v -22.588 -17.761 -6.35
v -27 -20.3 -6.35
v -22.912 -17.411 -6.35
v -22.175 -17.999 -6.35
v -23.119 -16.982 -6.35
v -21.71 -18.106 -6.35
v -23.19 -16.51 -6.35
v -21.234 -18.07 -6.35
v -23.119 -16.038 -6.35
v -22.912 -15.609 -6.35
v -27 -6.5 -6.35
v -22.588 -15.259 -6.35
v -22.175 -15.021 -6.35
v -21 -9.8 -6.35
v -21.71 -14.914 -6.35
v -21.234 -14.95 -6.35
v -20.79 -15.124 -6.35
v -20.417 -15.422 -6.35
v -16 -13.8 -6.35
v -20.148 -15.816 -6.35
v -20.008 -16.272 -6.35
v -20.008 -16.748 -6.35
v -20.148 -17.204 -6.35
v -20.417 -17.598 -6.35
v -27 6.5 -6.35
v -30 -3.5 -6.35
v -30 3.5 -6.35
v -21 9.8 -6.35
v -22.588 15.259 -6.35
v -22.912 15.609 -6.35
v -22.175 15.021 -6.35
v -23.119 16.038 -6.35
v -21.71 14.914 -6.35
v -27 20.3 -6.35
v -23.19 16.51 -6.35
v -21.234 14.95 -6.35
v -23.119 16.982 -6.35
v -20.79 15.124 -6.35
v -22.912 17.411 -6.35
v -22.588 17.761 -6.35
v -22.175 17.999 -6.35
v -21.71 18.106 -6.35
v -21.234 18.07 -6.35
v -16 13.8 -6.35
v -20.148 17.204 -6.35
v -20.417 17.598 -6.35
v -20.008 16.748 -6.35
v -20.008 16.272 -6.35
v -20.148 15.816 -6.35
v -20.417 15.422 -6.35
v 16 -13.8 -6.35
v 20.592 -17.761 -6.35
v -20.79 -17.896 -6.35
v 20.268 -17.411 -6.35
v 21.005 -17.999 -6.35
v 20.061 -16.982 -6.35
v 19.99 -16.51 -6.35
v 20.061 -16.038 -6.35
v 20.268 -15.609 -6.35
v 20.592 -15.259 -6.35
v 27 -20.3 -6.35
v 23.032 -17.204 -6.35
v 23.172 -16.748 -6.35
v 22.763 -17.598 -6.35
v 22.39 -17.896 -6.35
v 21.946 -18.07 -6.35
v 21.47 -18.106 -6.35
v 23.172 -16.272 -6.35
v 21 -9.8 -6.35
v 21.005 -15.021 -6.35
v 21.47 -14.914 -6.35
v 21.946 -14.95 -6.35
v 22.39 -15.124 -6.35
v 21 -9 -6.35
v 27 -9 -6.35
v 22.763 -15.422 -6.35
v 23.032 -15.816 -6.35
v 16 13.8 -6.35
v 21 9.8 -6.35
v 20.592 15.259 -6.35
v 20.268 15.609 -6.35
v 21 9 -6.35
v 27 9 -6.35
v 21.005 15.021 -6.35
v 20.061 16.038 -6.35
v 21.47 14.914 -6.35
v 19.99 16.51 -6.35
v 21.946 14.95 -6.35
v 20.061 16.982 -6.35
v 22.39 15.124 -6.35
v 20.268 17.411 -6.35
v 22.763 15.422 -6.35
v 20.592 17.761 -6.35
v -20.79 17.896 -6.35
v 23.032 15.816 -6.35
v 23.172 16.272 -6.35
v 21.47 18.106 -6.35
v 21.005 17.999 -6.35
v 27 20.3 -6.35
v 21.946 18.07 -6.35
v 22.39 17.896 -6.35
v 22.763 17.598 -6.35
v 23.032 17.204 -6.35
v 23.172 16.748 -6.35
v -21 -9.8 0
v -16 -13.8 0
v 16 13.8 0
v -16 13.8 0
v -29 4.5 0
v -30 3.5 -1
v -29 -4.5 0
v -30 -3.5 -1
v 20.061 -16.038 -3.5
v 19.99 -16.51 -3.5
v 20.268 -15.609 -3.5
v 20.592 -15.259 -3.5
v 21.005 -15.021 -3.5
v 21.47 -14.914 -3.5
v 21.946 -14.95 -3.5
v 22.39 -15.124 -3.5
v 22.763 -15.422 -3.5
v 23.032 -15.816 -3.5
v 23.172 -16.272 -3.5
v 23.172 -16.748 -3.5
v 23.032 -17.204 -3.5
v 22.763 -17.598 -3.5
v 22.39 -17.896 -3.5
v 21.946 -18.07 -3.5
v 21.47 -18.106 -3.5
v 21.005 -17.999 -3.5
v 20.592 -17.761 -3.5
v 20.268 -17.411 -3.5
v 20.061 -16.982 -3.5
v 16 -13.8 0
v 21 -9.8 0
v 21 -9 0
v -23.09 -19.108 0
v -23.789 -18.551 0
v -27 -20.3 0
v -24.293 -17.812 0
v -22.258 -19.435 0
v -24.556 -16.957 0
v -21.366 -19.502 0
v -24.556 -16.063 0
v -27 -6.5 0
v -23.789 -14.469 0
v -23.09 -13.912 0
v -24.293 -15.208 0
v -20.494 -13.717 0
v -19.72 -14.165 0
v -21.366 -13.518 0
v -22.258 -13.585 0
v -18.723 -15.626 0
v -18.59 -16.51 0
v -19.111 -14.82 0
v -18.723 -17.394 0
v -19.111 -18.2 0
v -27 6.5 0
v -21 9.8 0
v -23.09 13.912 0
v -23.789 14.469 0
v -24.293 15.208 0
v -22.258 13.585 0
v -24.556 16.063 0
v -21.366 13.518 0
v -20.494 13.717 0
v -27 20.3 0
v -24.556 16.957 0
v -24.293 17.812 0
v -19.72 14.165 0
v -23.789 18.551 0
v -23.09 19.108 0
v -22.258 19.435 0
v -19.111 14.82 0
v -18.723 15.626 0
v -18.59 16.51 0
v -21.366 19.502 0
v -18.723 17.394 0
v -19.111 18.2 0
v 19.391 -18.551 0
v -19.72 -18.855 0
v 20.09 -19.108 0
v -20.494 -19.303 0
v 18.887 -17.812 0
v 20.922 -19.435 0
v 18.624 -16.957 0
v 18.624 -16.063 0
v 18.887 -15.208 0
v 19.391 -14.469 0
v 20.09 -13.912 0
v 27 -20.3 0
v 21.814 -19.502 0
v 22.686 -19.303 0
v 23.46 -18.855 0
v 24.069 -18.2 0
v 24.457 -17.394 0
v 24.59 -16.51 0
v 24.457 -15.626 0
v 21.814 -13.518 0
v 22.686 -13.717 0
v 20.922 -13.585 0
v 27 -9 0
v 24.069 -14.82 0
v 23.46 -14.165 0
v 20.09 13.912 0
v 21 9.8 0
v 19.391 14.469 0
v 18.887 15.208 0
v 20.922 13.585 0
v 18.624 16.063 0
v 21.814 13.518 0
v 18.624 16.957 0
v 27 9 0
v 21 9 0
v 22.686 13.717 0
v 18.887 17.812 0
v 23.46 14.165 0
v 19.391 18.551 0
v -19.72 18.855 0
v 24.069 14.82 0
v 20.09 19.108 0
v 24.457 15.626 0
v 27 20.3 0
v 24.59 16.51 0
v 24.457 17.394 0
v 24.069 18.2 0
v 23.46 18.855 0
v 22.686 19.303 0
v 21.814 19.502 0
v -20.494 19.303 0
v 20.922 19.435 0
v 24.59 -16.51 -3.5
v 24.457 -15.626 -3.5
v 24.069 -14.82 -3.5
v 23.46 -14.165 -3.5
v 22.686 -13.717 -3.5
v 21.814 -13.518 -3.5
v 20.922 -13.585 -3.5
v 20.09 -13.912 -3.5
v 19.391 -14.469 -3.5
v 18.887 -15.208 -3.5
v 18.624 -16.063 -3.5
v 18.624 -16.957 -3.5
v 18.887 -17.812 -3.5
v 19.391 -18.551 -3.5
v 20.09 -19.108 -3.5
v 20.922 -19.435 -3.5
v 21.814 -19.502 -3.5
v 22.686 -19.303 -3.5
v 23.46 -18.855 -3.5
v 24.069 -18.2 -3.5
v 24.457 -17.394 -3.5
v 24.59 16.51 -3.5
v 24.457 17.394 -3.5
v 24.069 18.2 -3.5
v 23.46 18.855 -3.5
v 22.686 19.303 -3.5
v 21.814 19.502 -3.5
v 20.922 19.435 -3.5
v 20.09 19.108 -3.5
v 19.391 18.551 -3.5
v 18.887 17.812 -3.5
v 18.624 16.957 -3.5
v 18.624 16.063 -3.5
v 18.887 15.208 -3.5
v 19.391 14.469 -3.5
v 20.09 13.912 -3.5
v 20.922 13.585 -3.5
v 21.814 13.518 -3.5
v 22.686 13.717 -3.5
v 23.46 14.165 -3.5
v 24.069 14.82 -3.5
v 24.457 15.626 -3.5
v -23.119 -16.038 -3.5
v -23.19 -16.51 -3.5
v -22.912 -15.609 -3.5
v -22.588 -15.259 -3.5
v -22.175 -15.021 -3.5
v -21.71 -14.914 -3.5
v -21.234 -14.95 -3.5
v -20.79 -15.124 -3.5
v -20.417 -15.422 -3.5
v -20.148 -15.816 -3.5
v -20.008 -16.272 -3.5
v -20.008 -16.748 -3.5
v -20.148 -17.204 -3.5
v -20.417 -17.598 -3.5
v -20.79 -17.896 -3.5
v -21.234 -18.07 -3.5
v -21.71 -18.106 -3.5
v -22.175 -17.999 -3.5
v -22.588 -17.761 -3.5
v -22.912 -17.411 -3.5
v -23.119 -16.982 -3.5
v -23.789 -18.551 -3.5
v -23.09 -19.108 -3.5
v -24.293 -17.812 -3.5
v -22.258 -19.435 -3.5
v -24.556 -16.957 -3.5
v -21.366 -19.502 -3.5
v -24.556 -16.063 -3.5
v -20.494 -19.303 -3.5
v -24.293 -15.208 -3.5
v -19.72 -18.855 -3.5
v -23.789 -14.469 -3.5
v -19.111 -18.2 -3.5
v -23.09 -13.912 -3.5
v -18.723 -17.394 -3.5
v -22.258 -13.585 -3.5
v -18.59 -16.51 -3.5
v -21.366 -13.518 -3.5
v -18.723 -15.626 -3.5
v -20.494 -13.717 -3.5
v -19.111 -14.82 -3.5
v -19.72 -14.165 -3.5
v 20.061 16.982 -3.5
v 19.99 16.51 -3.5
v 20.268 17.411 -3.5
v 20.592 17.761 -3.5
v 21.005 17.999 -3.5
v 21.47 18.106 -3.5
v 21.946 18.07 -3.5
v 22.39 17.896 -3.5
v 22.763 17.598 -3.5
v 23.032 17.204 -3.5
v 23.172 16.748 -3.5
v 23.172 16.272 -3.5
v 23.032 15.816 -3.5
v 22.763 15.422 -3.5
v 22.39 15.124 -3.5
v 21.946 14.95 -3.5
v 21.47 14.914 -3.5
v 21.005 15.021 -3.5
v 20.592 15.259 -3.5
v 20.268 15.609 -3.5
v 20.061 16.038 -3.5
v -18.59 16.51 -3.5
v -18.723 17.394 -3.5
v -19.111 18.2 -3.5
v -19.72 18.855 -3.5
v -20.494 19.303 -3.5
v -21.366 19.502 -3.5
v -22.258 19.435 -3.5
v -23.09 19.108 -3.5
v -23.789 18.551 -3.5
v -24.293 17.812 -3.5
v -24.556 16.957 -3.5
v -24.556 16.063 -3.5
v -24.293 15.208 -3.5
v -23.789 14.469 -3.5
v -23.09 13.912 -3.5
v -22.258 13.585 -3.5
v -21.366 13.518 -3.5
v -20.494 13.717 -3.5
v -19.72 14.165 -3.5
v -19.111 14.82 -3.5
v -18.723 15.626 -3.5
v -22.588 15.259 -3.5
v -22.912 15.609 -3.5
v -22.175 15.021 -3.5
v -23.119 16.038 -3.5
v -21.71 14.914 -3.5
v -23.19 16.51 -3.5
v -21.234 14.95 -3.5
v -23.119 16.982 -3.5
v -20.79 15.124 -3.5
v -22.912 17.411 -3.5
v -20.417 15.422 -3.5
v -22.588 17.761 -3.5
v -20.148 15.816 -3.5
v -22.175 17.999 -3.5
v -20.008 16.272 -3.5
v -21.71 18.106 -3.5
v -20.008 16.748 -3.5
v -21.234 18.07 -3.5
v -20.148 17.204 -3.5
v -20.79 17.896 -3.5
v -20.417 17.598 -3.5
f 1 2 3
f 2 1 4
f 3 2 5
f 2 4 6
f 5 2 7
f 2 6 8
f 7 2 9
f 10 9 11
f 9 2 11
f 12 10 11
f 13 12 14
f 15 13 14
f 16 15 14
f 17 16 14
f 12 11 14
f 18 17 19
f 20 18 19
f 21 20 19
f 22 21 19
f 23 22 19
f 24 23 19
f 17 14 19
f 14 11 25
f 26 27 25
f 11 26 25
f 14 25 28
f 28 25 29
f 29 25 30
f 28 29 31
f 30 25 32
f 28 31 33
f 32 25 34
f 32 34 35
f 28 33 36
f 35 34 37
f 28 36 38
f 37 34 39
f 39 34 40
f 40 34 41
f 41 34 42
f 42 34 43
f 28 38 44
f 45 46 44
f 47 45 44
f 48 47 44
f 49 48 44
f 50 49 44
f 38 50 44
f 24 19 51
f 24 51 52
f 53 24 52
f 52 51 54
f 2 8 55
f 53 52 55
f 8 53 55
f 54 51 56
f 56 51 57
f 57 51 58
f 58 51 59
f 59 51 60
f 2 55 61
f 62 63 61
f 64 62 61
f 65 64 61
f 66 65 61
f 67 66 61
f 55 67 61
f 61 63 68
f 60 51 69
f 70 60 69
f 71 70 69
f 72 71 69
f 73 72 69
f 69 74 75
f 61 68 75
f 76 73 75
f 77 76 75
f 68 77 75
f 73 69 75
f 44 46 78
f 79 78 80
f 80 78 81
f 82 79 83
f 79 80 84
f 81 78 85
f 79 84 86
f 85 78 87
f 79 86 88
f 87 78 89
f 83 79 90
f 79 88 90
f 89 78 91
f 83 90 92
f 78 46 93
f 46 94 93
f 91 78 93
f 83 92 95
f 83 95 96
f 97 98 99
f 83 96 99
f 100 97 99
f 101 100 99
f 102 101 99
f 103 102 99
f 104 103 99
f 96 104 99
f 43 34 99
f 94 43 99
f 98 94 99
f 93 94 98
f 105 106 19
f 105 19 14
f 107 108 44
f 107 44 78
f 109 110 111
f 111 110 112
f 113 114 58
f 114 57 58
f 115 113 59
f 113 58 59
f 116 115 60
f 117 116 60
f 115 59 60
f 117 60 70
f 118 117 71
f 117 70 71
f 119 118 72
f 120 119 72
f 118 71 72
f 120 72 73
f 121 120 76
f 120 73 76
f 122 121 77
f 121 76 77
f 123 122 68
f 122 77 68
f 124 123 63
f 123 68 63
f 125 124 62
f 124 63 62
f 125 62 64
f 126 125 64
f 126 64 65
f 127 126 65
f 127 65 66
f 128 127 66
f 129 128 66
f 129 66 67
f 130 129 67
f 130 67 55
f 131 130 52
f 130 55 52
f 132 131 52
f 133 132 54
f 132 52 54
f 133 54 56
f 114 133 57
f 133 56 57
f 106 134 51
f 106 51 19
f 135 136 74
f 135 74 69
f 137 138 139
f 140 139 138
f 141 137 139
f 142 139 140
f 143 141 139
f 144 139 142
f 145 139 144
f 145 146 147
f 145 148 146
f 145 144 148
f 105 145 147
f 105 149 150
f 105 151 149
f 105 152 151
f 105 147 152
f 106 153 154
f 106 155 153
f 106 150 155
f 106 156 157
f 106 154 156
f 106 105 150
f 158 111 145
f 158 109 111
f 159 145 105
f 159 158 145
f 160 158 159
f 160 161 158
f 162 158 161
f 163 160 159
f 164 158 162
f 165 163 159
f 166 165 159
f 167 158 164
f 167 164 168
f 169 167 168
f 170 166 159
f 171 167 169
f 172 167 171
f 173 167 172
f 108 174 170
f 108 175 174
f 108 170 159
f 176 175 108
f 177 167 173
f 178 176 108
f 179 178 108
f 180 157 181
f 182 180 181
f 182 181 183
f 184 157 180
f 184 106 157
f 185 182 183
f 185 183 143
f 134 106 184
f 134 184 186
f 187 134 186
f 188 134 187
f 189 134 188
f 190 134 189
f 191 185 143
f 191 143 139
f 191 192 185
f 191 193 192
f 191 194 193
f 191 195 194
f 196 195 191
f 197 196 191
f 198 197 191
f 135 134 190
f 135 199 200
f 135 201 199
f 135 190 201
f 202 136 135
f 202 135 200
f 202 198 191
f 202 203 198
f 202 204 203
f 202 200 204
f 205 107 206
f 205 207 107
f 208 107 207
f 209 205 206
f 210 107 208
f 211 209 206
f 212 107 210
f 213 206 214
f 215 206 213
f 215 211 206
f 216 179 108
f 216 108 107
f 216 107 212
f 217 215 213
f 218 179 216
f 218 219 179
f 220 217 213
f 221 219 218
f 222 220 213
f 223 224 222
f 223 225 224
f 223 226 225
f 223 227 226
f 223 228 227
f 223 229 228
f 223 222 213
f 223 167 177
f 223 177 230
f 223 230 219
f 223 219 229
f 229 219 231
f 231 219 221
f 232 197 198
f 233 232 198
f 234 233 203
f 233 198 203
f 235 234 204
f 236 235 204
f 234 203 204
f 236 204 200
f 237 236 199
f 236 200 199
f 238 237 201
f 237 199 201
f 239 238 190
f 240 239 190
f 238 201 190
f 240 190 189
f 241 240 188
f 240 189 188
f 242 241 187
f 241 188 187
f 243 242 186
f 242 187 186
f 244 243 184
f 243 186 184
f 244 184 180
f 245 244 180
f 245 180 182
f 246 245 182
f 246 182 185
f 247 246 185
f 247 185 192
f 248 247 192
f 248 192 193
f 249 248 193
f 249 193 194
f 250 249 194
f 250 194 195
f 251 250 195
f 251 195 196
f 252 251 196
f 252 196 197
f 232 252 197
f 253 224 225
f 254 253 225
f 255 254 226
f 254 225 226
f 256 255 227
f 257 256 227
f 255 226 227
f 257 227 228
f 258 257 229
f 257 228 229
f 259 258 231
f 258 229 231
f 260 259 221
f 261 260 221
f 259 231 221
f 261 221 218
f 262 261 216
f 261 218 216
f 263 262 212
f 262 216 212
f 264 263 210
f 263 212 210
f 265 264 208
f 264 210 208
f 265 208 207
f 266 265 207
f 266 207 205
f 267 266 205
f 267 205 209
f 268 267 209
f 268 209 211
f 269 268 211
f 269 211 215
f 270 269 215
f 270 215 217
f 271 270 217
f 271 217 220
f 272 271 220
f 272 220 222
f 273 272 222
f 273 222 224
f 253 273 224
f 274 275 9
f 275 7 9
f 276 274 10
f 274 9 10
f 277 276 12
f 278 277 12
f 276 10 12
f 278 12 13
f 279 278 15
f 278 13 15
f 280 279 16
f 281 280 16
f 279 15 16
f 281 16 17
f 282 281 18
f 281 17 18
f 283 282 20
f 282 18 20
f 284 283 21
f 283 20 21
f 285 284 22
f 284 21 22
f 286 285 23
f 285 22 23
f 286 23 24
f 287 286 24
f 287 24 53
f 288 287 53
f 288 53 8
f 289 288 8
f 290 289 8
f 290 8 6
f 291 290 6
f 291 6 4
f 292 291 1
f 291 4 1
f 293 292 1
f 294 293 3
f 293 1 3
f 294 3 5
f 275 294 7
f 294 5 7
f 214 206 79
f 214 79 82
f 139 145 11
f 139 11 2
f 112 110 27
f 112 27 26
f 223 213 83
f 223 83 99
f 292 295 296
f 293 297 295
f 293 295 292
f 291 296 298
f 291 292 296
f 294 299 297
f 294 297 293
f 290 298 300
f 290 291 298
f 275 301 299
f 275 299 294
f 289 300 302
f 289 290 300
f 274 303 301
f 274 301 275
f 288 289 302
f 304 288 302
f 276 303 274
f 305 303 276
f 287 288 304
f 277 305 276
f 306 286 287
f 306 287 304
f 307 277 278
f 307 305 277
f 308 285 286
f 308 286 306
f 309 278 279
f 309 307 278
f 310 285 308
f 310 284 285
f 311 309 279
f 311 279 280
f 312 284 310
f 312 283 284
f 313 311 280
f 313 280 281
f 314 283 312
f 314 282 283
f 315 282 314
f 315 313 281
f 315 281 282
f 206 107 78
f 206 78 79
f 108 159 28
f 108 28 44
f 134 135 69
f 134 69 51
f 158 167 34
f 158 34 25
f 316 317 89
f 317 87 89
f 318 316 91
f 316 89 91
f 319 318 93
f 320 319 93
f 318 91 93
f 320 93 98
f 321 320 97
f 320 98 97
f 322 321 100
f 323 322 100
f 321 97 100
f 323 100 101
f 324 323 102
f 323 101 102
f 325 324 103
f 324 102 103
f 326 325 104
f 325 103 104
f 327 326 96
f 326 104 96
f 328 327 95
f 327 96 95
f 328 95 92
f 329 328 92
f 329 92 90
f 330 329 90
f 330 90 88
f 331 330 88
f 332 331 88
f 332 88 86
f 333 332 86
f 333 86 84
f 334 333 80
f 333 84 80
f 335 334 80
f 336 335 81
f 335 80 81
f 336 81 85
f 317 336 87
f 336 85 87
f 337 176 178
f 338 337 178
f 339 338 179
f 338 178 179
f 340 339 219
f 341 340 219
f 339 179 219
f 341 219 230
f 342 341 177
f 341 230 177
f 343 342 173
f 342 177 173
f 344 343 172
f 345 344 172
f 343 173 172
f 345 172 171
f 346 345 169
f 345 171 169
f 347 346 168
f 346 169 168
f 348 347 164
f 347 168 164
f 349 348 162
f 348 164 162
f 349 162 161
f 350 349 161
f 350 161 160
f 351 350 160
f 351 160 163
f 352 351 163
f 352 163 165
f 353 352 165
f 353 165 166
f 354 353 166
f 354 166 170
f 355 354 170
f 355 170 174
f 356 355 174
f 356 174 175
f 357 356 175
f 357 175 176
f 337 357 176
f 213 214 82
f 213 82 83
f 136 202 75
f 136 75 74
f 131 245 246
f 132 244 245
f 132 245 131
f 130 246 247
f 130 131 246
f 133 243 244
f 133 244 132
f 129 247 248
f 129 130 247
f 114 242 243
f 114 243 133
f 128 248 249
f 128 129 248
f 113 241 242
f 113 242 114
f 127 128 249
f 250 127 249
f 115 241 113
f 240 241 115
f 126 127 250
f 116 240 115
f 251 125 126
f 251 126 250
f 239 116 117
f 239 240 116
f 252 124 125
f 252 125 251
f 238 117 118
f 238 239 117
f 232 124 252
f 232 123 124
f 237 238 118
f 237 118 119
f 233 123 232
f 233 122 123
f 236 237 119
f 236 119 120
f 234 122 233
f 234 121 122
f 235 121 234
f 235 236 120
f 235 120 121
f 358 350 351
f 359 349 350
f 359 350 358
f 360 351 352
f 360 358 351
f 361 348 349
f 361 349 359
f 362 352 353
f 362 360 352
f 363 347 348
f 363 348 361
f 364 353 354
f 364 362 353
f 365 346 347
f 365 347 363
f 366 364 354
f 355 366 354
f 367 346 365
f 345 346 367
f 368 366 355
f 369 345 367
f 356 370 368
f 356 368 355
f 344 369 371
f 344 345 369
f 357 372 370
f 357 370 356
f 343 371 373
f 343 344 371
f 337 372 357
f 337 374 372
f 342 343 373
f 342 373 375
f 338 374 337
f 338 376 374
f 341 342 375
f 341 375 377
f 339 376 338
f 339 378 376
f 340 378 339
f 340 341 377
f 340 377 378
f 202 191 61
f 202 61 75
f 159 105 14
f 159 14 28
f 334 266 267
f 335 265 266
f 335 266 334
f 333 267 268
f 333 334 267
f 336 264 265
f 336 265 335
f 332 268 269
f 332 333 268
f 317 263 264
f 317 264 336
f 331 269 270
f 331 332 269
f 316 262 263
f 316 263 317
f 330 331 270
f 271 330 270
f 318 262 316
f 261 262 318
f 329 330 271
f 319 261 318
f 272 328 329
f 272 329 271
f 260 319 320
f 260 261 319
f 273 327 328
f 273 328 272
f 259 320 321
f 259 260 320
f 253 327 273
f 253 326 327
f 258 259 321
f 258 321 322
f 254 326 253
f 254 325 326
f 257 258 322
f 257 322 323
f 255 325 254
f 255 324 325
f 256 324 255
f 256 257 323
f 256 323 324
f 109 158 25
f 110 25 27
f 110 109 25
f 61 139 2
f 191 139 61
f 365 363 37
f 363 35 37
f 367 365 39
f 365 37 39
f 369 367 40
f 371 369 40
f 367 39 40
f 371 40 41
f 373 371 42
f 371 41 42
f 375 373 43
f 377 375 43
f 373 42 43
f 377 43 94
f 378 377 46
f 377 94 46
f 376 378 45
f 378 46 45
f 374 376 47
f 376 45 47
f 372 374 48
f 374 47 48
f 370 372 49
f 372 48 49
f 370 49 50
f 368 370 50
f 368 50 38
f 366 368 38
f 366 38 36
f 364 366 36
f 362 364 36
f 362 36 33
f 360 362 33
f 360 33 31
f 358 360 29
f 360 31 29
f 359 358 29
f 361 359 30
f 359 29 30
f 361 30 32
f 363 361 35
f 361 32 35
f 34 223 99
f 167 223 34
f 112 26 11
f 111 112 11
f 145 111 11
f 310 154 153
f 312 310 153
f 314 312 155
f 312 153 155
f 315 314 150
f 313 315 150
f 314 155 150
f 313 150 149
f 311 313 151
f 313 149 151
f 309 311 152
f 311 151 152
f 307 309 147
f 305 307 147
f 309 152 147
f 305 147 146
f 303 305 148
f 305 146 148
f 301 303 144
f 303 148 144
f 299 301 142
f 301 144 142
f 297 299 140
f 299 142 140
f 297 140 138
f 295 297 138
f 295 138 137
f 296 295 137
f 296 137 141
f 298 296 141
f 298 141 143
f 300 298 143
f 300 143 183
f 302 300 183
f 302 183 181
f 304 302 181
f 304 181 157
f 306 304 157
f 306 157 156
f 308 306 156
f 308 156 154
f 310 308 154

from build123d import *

# Parameters (mm, degrees)
F1_DEPTH       = 6.35
F2_D           = 3.2
F2_CBORE_D     = 6
F2_CBORE_DEPTH = 3.5
F3_SIZE        = 1


with BuildPart() as f1:
    # F0 (on Top) → F1 (new body)
    with BuildSketch(Plane.XY):
        Polygon((-27, -20.3), (27, -20.3), (27, -9), (21, -9), (21, -9.8), (16, -13.8), (-16, -13.8), (-21, -9.8), (-21, 9.8), (-16, 13.8), (16, 13.8), (21, 9.8), (21, 9), (27, 9), (27, 20.3), (-27, 20.3), (-27, 6.5), (-30, 3.5), (-30, -3.5), (-27, -6.5), align=None)
    extrude(amount=-F1_DEPTH)

    # F2 (through all)
    with Locations(Plane.XY):
        with Locations((-21.59, -16.51), (21.59, -16.51), (21.59, 16.51), (-21.59, 16.51)):
            CounterBoreHole(F2_D / 2, F2_CBORE_D / 2, F2_CBORE_DEPTH)

    # F3
    f3_edges = [f1.edges().sort_by_distance(p)[0] for p in [
        (-30, 0, 0),
    ]]
    chamfer(f3_edges, length=F3_SIZE)


solid = f1.part
